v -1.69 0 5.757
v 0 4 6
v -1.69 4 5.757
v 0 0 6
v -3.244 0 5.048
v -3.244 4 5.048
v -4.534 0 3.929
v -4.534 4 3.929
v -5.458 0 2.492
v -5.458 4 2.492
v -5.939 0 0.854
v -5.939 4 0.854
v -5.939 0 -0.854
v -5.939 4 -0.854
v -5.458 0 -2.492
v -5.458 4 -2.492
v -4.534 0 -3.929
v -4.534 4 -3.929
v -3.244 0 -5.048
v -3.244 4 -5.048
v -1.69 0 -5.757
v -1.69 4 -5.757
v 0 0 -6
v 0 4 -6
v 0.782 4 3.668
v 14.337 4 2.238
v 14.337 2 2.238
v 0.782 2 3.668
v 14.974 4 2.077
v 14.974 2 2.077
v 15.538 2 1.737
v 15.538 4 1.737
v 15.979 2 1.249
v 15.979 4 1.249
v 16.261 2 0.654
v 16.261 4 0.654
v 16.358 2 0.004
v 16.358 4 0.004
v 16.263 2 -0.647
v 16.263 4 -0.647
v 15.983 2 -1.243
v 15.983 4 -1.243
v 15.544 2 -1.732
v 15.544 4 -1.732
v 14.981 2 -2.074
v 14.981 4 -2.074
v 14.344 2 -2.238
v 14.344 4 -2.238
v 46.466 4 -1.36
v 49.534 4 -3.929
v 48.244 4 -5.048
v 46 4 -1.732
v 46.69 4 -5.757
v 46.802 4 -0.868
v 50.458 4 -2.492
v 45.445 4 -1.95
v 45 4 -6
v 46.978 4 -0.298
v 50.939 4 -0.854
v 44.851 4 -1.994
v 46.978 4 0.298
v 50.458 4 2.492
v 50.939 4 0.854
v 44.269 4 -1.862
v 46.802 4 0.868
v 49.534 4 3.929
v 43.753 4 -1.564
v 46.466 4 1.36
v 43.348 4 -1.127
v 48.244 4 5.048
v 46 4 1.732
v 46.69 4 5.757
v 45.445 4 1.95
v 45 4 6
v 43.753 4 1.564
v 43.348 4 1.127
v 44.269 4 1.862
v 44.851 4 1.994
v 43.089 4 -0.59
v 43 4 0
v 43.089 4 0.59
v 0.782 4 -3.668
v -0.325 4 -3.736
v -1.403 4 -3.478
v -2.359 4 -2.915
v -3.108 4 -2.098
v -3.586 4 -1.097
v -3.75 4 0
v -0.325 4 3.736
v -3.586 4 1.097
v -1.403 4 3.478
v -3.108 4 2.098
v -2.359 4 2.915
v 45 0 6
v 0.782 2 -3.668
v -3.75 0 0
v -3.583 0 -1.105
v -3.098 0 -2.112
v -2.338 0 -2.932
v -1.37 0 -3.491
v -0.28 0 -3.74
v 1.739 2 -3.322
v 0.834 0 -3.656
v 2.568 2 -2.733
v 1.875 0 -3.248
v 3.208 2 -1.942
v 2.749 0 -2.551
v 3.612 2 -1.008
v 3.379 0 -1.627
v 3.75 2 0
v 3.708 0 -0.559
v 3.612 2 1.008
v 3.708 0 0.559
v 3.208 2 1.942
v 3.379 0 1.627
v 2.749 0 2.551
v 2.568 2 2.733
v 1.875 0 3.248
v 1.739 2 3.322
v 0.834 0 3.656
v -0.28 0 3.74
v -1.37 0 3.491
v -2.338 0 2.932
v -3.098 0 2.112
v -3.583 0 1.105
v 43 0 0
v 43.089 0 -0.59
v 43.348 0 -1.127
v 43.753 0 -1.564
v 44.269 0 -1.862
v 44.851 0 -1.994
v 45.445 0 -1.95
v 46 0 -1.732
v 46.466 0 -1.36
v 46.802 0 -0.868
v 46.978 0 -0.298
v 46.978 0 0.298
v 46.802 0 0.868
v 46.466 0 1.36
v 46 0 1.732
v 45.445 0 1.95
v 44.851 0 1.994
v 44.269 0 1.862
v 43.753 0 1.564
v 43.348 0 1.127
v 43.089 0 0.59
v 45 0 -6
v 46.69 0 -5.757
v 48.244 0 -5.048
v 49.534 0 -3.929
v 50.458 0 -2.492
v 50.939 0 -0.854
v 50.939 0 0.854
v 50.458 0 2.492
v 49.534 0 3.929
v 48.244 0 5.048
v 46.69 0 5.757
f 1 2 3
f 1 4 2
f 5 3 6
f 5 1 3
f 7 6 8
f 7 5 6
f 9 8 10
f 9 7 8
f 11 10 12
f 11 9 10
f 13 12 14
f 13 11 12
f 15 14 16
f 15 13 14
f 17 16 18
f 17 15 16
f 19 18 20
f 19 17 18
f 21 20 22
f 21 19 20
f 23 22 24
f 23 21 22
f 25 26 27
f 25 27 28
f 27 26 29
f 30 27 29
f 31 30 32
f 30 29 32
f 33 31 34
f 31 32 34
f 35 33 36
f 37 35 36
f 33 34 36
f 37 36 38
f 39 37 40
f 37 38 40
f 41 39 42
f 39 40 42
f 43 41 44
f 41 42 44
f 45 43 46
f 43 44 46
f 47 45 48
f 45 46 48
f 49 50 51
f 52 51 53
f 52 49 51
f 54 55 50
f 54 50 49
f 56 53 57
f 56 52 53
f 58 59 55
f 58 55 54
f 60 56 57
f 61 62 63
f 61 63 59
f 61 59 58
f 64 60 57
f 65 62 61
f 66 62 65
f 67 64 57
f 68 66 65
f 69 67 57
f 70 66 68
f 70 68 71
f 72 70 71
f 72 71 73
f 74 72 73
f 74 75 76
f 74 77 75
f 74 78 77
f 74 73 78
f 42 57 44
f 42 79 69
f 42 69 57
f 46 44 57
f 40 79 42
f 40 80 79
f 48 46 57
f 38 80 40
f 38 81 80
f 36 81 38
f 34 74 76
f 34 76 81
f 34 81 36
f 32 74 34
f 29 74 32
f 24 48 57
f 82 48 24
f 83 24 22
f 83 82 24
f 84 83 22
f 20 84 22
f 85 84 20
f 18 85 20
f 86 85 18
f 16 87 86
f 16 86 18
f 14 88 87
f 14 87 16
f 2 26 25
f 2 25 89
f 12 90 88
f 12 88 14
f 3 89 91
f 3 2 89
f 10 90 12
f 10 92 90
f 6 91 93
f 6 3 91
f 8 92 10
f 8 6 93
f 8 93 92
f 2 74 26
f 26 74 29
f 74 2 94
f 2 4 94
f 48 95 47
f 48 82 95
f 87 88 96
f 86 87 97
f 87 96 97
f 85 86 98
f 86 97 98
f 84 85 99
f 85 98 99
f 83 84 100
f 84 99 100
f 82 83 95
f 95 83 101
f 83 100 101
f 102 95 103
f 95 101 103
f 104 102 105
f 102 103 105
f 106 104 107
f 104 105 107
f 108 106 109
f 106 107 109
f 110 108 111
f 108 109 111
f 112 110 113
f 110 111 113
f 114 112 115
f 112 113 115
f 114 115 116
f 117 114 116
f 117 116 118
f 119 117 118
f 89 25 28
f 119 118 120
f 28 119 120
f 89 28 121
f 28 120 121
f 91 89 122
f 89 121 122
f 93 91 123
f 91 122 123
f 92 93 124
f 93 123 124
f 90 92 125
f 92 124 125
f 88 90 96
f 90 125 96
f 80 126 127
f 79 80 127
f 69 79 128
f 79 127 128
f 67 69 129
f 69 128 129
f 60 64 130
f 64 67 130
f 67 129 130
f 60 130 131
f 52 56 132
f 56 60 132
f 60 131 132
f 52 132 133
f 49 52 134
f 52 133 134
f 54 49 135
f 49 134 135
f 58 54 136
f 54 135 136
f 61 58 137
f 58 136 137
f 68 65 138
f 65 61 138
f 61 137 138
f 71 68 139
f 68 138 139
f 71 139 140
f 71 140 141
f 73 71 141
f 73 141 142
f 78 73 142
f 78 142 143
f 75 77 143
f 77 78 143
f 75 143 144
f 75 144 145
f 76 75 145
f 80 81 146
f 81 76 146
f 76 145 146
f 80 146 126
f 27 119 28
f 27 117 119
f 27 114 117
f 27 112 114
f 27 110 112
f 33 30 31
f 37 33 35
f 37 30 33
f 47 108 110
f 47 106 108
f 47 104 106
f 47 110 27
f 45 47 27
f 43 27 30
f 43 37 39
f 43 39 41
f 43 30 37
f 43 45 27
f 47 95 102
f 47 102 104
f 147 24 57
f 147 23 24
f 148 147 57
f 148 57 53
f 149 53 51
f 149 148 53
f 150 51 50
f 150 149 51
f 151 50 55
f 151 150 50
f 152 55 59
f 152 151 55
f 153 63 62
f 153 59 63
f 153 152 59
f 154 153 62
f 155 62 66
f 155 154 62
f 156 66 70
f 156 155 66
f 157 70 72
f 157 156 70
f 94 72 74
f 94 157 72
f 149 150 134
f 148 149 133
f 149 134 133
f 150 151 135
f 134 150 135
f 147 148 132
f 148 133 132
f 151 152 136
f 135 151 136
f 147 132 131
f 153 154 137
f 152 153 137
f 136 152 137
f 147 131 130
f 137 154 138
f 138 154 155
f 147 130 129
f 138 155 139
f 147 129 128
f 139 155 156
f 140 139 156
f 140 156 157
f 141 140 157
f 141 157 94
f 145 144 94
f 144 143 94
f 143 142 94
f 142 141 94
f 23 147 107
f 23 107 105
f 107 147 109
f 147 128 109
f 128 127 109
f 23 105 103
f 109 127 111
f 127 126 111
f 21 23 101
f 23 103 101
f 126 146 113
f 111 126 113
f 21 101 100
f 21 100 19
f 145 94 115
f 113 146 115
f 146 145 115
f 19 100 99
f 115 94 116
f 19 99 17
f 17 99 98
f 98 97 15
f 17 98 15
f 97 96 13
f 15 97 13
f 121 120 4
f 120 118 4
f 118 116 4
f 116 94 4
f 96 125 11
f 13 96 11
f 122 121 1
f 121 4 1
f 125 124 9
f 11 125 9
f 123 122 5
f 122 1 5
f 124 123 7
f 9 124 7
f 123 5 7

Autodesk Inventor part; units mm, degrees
ref_plane "YZ Plane" through (0, 0, 0) normal (1, 0, 0) x (0, 1, 0)
ref_plane "XZ Plane" through (0, 0, 0) normal (0, 1, 0) x (-1, 0, 0)
ref_plane "XY Plane" through (0, 0, 0) normal (0, 0, 1) x (1, 0, 0)
sketch "Sketch1" plane through (0, 0, 0) normal (0, 1, 0) x (-1, 0, 0)
  circle A0 centre (0, 0) radius 3.75
  circle A1 centre (0, 0) radius 6
  circle A2 centre (-45, 0) radius 2
  circle A3 centre (-45, 0) radius 6
  line L0 (0, 6) -> (-45, 6)
  line L1 (0, -6) -> (-45, -6)
  dimension "d0" = 7.5
  dimension "d1" = 12
  dimension "d2" = 4
  dimension "d3" = 45
  dimension "d4" = 12
extrude "Extrusion2" add sketch "Sketch1" along normal blind 4
sketch "Sketch2" plane through (0, 4, 0) normal (0, 1, 0) x (1, 0, 0)
  arc A0 (14.3366, -2.2384) -> (14.3439, 2.2376) centre (14.108, 0) ccw
  circle A1 centre (0, 0) radius 3.75 projected
  arc A2 (0.7821, 3.6675) -> (2.5223, -2.775) centre (0, 0) ccw
  line L0 (0.7821, 3.6675) -> (14.3439, 2.2376)
  line L1 (14.3366, -2.2384) -> (0, -3.75)
  point P0 (2.5223, 2.775)
  dimension "d9" = 14.108
  dimension "d10" = 4.5
  dimension "d11" = 2.775
  dimension "d12" = 2.5223
  dimension "d13" = 5.55
extrude "Extrusion3" cut sketch "Sketch2" against normal blind 2 contours L1 A1 L0 A0
properties part number "Stewart_ServoArm"
